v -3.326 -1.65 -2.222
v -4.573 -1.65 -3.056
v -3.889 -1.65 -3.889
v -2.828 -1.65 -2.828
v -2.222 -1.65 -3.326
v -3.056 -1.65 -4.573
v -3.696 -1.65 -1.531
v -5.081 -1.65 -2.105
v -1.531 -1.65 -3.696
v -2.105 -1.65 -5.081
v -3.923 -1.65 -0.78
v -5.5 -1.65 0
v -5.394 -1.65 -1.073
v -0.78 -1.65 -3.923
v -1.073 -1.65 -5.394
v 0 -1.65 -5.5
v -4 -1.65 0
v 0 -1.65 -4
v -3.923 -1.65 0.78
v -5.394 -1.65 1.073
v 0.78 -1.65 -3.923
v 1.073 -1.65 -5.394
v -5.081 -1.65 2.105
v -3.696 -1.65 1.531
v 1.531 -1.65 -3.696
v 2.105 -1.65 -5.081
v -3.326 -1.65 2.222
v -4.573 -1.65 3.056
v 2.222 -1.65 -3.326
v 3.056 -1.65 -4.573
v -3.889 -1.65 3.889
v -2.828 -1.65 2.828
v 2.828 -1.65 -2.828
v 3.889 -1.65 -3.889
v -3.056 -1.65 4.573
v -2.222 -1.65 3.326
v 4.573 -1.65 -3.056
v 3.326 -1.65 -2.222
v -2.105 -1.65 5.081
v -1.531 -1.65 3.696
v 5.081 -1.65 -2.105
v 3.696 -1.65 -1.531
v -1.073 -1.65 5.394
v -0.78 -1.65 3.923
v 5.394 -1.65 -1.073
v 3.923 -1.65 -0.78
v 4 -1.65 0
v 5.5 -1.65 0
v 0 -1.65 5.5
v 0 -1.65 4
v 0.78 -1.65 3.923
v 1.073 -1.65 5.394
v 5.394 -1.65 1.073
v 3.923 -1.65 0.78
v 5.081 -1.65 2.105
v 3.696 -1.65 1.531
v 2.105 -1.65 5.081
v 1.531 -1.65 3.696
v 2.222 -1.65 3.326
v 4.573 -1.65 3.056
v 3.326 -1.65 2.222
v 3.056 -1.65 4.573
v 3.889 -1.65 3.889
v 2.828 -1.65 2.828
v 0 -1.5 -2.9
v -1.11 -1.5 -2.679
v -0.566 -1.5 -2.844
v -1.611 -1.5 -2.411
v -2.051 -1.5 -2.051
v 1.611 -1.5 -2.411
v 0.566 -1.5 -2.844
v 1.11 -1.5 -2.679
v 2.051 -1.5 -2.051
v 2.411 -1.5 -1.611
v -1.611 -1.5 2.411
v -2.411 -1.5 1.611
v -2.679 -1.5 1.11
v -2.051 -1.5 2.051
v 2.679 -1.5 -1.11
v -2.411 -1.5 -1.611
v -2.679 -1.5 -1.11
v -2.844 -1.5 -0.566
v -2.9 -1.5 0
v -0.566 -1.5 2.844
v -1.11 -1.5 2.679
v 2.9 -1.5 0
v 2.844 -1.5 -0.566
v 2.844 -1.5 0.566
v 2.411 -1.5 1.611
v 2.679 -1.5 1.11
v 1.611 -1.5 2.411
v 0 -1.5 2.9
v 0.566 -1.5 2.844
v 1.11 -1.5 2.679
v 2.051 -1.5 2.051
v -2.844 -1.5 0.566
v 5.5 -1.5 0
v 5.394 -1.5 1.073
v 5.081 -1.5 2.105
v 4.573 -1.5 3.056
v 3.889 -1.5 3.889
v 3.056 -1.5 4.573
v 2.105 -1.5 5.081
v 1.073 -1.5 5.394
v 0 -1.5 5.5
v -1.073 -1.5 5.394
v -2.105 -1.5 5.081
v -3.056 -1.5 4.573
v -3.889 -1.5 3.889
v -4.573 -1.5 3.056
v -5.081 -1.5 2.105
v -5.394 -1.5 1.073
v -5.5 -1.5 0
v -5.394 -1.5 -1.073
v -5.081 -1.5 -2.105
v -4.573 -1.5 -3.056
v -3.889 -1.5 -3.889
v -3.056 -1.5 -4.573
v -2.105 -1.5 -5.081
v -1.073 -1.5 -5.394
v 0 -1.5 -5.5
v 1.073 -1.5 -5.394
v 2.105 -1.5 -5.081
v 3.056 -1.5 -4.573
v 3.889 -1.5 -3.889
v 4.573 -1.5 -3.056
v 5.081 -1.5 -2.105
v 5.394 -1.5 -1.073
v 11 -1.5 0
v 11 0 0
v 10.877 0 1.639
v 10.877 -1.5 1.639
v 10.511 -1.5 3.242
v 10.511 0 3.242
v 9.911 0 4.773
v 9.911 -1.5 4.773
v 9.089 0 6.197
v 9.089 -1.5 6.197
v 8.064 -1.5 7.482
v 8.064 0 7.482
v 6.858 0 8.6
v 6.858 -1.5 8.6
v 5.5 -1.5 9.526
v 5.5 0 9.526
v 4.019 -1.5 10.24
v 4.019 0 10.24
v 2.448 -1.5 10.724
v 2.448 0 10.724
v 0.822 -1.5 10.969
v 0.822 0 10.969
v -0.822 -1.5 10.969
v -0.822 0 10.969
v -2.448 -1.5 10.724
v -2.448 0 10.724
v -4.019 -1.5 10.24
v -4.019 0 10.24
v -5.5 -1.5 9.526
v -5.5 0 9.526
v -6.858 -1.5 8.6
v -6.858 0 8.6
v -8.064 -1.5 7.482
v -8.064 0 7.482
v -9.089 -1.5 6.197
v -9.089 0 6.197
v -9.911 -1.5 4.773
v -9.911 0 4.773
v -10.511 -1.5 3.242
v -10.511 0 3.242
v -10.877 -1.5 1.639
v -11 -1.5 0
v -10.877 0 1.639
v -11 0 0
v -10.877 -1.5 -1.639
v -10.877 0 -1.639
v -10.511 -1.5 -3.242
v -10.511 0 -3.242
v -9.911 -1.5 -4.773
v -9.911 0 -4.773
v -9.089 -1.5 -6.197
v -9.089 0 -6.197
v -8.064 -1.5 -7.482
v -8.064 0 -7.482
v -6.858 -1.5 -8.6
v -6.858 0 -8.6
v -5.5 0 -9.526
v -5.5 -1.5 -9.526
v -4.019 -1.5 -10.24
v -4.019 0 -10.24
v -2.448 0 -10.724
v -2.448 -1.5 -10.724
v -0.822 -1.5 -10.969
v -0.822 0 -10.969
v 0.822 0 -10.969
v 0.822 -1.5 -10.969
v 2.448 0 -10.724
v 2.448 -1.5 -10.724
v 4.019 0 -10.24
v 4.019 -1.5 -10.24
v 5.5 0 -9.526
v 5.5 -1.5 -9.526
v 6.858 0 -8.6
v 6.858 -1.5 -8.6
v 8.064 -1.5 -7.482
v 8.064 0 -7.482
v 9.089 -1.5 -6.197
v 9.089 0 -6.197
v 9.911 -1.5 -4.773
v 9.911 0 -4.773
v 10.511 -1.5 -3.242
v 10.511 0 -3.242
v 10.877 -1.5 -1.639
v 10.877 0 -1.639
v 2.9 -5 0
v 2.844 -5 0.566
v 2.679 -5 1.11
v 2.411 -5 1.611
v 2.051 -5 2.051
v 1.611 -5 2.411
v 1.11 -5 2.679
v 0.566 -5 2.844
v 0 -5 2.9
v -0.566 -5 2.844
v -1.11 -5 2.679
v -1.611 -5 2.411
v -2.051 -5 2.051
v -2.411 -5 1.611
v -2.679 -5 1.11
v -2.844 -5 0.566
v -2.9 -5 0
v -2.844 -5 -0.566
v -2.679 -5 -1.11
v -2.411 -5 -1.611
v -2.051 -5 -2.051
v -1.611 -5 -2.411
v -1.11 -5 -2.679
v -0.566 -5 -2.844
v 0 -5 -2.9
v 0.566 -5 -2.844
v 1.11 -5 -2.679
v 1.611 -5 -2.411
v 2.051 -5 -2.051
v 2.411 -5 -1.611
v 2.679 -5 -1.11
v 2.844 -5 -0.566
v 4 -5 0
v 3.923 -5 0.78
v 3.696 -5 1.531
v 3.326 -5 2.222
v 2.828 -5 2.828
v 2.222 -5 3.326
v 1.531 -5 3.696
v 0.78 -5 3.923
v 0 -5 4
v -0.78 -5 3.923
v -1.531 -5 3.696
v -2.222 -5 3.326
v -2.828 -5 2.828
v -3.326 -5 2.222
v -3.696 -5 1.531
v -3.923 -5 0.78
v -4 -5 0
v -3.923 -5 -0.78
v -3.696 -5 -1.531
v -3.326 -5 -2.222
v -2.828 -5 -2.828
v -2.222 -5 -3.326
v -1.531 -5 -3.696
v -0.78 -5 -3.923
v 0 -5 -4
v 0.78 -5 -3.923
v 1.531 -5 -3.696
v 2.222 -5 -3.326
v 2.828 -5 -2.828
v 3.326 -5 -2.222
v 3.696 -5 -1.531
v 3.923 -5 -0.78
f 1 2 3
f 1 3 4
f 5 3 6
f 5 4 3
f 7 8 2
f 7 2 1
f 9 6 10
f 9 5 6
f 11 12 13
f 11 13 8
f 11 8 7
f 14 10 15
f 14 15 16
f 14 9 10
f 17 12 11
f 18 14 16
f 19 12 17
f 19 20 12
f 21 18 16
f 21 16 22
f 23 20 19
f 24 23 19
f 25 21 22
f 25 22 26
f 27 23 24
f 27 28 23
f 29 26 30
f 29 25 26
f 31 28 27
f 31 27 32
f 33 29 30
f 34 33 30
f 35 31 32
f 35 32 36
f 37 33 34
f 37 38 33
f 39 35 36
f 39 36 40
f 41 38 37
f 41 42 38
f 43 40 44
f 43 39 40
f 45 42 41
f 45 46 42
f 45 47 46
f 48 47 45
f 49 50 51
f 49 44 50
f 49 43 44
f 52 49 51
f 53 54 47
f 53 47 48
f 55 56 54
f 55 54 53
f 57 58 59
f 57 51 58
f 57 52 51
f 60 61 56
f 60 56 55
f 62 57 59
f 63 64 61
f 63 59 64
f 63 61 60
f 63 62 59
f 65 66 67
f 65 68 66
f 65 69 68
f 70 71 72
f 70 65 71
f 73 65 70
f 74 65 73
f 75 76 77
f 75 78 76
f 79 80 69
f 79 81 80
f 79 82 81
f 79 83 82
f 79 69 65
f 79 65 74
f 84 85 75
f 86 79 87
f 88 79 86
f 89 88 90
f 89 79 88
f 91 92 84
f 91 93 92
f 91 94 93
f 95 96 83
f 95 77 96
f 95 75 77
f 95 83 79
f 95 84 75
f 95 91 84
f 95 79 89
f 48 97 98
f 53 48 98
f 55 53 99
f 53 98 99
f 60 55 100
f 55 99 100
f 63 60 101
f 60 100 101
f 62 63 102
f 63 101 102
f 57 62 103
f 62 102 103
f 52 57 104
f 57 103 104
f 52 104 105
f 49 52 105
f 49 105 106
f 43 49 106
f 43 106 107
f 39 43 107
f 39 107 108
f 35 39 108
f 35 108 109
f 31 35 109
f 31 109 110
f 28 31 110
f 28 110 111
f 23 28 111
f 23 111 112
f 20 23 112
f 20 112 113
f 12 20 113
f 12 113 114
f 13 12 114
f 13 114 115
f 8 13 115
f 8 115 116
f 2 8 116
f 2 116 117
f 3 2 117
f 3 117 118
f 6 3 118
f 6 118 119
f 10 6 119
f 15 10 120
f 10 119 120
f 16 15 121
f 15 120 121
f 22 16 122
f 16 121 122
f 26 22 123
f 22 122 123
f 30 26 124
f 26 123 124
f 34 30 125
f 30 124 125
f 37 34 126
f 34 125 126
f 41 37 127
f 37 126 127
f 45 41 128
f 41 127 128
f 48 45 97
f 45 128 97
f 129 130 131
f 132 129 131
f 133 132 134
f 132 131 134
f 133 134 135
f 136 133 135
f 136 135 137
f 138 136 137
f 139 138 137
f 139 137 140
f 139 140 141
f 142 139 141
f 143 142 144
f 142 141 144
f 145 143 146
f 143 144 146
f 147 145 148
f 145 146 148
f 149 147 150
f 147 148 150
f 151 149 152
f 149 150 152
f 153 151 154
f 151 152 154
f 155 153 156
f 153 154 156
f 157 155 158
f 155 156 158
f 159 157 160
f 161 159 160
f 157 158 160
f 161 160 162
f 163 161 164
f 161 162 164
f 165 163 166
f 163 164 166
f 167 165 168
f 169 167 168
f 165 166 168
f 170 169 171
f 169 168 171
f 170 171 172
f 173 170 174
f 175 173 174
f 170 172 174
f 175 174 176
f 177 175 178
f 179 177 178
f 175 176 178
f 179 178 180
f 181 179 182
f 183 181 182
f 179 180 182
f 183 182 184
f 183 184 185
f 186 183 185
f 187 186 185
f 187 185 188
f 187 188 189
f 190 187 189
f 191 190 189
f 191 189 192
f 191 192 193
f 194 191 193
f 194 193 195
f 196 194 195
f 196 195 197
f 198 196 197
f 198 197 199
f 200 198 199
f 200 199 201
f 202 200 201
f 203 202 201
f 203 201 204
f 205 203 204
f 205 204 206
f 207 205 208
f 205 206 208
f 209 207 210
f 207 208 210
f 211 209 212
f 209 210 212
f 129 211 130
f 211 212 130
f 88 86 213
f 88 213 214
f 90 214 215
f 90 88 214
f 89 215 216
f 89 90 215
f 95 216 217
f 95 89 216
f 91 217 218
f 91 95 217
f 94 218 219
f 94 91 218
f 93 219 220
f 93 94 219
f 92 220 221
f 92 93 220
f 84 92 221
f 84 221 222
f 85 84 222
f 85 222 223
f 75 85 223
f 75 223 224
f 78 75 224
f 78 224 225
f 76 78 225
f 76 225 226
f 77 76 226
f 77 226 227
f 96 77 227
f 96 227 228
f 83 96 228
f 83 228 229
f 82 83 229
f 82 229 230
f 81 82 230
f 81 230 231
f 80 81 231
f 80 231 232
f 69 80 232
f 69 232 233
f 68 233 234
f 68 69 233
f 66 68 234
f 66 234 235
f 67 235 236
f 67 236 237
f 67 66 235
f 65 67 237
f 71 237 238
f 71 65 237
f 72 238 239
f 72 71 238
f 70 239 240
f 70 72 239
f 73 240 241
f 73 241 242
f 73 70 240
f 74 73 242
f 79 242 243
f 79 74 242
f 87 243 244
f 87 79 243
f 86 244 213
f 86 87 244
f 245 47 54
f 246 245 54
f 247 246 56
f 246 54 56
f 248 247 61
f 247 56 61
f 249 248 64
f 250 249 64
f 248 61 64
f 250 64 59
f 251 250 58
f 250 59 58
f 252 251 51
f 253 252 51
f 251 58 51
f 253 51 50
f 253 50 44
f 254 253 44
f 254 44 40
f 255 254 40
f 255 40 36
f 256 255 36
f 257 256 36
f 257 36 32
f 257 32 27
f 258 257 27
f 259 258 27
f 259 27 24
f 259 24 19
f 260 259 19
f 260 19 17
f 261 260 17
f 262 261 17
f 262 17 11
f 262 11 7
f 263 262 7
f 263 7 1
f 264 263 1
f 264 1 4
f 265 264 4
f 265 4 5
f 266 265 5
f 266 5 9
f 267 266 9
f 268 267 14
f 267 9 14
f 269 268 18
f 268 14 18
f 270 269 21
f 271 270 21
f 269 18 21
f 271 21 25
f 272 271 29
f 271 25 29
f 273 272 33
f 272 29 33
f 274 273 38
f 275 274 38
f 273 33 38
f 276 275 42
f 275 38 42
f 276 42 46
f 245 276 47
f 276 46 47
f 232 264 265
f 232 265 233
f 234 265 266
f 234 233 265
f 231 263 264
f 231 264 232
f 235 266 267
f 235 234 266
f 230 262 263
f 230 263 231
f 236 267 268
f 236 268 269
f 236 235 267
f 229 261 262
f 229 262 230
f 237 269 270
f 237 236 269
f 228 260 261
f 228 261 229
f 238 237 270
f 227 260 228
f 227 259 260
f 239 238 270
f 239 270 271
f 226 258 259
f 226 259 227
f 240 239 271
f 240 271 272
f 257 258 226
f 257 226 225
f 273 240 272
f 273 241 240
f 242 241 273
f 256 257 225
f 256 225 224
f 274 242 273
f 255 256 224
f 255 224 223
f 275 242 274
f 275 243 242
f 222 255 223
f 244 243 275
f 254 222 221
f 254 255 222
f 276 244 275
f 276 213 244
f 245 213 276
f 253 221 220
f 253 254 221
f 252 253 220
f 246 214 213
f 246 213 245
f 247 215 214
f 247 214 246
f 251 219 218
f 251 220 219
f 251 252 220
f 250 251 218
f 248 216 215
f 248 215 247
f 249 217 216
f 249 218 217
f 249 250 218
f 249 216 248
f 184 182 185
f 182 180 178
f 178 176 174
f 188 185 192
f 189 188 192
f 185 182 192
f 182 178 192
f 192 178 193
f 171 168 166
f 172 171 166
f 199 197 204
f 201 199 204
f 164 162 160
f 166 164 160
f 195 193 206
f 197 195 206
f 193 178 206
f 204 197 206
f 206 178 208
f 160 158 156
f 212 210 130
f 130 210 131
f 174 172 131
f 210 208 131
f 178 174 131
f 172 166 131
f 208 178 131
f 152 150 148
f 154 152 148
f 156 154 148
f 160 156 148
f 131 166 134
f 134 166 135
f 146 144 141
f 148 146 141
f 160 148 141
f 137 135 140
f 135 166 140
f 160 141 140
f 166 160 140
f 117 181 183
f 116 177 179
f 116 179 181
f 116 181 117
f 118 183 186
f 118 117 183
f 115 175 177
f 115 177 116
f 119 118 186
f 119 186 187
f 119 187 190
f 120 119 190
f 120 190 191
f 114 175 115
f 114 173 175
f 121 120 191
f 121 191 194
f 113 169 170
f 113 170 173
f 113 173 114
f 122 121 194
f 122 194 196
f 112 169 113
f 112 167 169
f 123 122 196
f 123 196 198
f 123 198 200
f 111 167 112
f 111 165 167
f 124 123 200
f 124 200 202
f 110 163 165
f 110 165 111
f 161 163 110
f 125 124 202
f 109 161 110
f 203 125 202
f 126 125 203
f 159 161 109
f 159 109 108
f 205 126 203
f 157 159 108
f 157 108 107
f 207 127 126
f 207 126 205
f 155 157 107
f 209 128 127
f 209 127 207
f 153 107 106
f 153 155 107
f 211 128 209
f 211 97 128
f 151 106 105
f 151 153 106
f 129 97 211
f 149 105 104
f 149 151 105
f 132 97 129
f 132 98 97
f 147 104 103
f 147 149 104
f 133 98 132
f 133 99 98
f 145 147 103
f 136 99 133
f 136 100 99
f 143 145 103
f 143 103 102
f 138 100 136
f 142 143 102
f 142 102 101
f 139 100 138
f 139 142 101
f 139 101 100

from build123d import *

# Parameters (mm, degrees)
F0_R     = 11
F0_R_2   = 5.5
F0_R_3   = 4
F0_R_4   = 2.9
F1_DEPTH = 1.5
F2_DEPTH = 1.65
F3_DEPTH = 5


with BuildPart() as f1:
    # F0 (on Front) → F1 (new body)
    with BuildSketch(Plane.XZ):
        Circle(F0_R)
        Circle(F0_R_2, mode=Mode.SUBTRACT)
        Circle(F0_R_2)
        Circle(F0_R_3, mode=Mode.SUBTRACT)
        Circle(F0_R_3)
        Circle(F0_R_4, mode=Mode.SUBTRACT)
        Circle(F0_R_4)
    extrude(amount=F1_DEPTH)

    # F0 (on Front) → F2 (join)
    with BuildSketch(Plane.XZ):
        Circle(F0_R_2)
        Circle(F0_R_3, mode=Mode.SUBTRACT)
    extrude(amount=F2_DEPTH)

    # F0 (on Front) → F3 (join)
    with BuildSketch(Plane.XZ):
        Circle(F0_R_3)
        Circle(F0_R_4, mode=Mode.SUBTRACT)
    extrude(amount=F3_DEPTH)


solid = f1.part
